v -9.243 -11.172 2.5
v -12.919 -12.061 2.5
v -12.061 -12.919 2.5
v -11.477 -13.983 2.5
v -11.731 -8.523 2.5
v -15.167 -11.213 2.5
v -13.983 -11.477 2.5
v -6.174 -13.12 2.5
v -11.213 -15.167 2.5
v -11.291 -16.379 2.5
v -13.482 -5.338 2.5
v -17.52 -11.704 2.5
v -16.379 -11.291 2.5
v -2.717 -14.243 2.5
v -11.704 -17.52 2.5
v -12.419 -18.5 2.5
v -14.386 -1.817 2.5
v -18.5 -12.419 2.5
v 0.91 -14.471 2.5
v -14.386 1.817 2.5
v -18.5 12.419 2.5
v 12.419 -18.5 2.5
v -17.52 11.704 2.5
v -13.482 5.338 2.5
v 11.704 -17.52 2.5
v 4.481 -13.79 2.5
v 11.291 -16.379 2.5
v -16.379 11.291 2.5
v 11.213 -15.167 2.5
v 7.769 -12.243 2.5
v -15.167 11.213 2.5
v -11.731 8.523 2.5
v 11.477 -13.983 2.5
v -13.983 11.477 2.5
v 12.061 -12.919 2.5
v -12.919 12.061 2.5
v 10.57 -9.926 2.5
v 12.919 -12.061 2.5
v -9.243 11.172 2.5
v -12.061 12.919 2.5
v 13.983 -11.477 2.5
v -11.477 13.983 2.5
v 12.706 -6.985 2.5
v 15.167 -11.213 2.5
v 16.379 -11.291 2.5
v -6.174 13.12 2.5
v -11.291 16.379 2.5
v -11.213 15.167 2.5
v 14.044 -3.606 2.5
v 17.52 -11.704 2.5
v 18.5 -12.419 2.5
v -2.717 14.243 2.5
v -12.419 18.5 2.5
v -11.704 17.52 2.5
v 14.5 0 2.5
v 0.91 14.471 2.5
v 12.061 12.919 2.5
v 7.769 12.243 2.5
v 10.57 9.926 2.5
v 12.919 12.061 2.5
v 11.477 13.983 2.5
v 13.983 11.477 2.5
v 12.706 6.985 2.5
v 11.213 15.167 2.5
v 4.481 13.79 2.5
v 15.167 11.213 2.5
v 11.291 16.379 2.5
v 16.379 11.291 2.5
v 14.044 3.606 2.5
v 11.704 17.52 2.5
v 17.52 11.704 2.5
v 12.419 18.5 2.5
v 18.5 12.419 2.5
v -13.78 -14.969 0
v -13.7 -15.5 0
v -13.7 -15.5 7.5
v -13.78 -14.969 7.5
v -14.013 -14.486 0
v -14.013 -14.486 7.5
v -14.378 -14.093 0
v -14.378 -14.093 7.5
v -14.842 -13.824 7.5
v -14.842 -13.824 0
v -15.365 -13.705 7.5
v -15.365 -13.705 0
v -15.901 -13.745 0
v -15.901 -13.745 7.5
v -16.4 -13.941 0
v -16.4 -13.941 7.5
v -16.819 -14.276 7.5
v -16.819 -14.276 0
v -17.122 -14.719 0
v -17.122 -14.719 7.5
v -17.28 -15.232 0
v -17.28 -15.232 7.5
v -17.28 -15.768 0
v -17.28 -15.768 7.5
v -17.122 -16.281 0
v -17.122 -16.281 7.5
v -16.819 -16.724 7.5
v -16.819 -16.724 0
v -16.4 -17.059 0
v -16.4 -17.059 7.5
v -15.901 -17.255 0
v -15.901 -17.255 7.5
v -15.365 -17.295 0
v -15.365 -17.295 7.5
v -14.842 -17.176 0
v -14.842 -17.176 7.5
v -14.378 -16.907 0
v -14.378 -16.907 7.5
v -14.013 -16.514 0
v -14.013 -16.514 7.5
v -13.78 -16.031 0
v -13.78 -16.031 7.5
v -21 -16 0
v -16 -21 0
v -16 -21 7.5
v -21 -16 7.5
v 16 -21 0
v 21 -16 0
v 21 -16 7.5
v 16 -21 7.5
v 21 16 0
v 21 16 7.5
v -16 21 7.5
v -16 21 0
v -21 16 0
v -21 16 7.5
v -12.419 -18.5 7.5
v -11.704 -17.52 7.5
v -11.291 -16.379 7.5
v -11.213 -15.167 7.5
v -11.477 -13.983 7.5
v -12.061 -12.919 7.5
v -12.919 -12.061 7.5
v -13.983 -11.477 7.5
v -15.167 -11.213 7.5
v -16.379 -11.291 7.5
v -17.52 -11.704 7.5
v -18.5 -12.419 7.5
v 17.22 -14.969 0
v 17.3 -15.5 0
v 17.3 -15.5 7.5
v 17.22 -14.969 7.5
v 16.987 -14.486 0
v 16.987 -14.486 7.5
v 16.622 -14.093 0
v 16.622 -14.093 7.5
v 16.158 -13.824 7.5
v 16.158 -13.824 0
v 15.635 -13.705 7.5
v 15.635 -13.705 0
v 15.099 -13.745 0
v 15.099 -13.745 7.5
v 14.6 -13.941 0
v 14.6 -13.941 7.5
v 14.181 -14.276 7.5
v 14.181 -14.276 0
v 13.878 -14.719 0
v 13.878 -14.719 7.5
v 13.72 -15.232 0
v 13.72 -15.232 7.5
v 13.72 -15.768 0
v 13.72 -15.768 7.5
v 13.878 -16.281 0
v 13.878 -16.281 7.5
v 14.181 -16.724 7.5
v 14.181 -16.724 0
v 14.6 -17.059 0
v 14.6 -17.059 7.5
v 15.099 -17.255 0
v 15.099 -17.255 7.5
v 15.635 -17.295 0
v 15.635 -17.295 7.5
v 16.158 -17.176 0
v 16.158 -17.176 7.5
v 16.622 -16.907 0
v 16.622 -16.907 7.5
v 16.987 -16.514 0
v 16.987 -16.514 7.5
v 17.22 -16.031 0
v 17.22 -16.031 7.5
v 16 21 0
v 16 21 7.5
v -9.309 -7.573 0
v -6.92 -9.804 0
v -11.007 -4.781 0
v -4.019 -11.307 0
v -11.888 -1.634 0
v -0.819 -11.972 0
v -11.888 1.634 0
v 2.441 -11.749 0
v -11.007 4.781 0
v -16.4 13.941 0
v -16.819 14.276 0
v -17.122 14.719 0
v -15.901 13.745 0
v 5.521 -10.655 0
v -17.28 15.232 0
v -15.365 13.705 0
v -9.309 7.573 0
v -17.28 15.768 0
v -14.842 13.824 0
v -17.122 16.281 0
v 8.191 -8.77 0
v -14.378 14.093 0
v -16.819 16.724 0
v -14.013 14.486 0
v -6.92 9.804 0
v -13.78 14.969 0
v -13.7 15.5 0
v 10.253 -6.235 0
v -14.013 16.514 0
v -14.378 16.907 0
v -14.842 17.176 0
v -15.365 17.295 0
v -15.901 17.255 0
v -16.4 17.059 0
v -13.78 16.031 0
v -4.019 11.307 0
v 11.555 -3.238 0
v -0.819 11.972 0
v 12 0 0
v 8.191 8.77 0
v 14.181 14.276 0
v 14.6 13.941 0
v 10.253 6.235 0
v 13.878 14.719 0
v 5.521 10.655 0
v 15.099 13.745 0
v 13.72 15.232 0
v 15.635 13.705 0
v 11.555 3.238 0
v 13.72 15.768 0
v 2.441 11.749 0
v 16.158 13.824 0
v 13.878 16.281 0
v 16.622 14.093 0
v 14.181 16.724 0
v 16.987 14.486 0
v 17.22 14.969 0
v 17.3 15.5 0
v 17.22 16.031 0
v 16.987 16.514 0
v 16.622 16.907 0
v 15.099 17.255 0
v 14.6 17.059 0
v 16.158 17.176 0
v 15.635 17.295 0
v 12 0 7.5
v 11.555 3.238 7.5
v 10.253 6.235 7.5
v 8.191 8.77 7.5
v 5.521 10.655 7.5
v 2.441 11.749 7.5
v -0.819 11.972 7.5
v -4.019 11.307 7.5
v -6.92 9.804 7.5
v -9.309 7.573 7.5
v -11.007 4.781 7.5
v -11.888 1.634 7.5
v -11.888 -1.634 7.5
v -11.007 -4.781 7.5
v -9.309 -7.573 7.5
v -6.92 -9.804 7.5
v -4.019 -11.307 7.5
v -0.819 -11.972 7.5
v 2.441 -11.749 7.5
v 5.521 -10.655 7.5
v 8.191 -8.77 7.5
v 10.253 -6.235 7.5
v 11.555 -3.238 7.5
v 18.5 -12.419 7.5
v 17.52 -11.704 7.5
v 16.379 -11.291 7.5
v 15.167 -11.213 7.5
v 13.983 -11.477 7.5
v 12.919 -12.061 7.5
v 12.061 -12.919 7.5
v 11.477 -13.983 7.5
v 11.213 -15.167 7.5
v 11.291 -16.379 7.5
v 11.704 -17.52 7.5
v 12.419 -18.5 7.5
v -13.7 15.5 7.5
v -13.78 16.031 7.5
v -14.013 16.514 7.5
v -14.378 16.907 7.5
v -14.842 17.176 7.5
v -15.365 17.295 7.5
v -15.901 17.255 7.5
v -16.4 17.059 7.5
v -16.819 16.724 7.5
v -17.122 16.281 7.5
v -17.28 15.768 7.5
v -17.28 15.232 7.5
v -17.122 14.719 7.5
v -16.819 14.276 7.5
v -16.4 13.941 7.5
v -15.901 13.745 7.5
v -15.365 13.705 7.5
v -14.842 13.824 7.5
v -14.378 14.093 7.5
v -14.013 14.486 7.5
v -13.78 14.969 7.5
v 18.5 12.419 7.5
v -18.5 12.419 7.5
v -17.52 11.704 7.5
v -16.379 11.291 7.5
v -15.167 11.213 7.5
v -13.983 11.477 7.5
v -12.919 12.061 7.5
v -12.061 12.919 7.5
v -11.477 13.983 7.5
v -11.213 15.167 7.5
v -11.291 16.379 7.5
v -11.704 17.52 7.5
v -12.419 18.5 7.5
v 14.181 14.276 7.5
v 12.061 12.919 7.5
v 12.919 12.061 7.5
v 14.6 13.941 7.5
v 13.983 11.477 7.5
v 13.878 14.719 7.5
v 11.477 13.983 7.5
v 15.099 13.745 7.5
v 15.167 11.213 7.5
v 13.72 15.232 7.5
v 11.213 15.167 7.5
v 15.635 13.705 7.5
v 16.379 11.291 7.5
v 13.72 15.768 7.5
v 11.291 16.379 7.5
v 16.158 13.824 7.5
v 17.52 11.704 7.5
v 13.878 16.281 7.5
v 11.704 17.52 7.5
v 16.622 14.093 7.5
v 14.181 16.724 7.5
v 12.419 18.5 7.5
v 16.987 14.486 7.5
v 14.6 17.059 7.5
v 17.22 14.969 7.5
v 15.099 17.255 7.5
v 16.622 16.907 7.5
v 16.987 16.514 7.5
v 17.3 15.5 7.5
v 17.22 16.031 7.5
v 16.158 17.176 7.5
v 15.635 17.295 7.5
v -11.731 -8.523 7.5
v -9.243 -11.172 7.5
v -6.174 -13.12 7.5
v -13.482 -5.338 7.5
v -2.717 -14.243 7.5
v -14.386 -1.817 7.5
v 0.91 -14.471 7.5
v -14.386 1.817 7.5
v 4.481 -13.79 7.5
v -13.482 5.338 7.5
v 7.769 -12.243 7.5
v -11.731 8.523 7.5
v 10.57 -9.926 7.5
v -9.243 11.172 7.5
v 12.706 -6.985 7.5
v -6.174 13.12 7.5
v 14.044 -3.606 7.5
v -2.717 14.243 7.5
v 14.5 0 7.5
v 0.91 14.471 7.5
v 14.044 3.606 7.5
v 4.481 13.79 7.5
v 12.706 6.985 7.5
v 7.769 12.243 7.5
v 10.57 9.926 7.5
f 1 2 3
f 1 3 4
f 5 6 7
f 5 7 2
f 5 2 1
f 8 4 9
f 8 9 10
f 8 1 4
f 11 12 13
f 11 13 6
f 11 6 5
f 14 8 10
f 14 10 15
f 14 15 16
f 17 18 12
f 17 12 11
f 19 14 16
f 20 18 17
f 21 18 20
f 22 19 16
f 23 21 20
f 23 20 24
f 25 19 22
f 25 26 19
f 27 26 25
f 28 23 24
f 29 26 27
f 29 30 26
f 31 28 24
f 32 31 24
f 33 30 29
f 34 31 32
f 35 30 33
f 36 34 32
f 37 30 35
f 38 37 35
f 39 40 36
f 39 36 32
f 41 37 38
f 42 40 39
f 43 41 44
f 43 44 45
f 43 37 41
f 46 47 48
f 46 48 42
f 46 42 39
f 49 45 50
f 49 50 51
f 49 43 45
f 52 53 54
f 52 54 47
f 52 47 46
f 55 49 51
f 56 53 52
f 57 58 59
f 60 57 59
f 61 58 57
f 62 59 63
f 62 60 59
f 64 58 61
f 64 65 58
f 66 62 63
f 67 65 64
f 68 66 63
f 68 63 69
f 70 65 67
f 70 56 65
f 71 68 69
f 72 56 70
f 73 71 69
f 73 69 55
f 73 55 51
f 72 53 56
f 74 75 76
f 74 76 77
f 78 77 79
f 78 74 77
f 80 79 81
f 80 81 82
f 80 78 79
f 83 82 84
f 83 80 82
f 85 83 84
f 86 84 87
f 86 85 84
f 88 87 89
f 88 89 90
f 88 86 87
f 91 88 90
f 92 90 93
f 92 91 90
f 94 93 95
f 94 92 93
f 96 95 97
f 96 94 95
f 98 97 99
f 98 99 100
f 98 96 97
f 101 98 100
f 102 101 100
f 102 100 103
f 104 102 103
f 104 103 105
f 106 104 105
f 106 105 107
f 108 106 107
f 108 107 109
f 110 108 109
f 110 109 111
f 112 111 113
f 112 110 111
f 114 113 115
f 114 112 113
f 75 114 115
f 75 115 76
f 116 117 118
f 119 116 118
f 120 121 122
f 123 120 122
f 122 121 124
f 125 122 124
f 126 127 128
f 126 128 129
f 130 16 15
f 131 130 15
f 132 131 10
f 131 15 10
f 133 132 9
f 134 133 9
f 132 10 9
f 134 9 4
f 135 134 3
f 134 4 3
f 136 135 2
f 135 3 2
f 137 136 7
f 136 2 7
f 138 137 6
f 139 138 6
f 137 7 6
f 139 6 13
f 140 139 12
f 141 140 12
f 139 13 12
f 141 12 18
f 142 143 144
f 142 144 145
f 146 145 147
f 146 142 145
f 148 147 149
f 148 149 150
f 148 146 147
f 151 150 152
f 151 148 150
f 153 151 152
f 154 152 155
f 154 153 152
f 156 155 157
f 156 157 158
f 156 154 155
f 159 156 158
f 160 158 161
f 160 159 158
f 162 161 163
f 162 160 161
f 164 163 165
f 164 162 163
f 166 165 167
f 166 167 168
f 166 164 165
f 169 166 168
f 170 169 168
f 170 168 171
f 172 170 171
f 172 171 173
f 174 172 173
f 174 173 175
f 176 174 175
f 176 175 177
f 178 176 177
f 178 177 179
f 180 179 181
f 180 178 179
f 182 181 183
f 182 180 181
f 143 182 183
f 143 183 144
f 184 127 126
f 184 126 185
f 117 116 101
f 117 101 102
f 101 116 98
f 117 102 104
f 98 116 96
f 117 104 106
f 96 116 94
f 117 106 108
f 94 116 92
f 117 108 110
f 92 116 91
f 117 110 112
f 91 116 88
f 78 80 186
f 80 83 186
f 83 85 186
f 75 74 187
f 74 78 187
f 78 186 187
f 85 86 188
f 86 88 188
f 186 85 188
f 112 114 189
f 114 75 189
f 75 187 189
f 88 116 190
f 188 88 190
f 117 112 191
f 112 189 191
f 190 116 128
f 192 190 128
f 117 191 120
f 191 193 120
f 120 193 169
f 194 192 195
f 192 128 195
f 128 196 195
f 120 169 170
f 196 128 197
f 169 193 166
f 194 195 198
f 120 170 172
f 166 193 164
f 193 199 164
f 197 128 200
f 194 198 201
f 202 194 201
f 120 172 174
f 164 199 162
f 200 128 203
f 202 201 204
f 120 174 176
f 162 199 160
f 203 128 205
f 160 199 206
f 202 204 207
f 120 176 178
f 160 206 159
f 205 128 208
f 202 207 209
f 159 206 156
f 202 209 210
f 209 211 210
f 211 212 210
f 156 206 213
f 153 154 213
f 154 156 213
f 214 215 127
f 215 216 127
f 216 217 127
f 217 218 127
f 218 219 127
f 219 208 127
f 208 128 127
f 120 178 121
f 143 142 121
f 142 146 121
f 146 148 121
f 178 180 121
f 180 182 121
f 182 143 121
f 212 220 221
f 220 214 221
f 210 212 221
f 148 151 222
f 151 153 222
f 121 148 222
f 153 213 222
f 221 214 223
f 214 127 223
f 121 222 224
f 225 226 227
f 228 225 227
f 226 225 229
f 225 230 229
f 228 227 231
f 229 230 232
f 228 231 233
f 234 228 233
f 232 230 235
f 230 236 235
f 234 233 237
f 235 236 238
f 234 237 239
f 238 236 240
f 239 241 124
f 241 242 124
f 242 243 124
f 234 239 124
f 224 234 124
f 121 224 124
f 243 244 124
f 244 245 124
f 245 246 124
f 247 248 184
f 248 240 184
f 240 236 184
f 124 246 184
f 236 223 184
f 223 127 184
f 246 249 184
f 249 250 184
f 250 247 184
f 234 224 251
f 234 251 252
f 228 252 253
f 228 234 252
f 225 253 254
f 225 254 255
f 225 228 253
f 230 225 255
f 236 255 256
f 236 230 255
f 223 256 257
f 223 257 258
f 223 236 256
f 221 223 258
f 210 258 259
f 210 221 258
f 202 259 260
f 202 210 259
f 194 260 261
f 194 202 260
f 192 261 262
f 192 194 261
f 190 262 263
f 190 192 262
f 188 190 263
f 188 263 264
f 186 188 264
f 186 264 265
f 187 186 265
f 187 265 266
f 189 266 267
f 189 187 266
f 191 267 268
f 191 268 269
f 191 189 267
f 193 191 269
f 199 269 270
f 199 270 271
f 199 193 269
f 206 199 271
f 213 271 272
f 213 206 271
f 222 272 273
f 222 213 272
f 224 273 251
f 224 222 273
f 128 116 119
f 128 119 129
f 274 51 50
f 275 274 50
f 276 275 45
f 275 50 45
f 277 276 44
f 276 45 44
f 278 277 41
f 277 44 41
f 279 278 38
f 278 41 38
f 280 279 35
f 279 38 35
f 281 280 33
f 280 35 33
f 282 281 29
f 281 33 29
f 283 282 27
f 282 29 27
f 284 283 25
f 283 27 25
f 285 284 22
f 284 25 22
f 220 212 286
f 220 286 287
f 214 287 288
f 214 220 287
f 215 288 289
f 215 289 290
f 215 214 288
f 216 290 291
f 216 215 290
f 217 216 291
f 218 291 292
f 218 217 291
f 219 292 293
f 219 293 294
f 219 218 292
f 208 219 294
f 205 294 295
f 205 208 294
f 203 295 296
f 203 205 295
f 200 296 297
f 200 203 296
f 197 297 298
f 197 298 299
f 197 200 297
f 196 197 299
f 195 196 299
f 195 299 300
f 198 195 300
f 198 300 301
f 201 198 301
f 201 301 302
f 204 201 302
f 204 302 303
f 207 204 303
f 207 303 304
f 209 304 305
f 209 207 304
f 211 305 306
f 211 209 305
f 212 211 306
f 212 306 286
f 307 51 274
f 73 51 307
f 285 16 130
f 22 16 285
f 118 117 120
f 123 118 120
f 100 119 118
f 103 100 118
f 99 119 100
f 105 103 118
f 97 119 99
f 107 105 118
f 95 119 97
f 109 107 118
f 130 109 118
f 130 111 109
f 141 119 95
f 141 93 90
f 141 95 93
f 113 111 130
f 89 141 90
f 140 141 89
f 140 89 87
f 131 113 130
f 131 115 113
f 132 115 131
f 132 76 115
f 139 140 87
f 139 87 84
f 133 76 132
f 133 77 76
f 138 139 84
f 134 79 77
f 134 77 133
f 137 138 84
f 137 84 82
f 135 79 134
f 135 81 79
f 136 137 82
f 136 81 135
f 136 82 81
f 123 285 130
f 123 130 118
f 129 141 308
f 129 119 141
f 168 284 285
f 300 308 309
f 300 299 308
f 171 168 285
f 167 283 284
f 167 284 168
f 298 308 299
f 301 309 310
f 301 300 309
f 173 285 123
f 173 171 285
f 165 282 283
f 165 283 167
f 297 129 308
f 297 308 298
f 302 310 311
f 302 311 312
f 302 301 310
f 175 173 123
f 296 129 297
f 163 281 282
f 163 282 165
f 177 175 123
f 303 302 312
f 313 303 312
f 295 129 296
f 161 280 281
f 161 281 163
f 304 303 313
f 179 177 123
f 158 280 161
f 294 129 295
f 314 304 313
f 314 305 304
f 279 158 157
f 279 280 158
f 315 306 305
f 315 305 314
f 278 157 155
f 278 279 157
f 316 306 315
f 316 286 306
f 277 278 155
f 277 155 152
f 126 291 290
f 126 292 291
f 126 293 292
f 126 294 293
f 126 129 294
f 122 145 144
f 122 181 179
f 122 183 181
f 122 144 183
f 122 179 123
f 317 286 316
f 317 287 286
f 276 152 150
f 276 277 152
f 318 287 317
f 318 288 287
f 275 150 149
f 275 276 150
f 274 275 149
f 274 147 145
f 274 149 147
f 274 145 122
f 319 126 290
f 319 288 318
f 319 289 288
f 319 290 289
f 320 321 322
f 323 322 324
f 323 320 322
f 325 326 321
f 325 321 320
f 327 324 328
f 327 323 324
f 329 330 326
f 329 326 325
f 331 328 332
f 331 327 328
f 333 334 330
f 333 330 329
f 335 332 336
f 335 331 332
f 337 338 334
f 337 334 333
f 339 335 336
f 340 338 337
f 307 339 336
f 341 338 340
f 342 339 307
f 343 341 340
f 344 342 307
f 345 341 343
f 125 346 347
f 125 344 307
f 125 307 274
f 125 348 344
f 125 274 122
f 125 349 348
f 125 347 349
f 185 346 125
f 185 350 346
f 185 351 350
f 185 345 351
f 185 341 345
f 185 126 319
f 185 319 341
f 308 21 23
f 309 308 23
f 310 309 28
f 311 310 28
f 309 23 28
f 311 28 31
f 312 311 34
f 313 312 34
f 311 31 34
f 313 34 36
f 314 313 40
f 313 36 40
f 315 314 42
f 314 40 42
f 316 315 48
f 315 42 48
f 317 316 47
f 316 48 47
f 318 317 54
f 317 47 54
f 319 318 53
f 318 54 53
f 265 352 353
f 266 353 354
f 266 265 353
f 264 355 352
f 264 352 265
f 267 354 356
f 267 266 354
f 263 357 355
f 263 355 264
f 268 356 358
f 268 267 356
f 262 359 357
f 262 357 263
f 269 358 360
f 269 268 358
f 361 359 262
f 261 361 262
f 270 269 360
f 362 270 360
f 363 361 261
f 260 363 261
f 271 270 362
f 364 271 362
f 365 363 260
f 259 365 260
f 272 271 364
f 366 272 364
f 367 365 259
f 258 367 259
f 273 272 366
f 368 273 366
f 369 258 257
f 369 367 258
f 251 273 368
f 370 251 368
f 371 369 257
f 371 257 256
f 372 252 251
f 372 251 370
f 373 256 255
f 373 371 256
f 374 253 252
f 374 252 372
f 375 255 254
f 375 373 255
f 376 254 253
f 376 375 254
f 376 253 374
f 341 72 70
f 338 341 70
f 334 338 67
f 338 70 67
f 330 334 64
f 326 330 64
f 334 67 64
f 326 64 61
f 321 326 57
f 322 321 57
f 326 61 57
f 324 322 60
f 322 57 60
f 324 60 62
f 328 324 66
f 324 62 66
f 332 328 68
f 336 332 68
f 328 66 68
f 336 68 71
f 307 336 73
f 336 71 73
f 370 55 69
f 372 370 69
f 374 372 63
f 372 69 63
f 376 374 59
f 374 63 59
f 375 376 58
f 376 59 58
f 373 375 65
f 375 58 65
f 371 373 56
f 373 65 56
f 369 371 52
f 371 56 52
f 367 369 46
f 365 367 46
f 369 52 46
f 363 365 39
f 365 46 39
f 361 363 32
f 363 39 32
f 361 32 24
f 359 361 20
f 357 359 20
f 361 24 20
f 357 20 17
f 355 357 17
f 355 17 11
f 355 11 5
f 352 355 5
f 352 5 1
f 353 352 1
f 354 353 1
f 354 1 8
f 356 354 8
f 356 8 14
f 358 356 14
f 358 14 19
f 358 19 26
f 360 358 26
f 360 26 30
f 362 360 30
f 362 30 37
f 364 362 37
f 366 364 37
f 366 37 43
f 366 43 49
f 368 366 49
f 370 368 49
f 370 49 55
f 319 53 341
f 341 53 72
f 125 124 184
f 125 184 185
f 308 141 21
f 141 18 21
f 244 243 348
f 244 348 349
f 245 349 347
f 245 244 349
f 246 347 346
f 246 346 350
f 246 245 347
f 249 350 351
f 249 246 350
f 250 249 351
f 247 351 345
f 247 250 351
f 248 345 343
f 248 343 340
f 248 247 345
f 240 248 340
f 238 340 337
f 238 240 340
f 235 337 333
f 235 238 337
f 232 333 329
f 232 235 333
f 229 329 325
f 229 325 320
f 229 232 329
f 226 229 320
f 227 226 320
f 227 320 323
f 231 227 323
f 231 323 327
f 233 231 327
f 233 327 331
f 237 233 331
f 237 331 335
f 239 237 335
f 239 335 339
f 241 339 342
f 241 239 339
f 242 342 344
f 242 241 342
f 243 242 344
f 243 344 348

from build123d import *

# Parameters (mm, degrees)
F0_W     = 42
F0_H     = 42
F0_R     = 1.8
F0_R_2   = 12
F1_DEPTH = 7.5
F2_SIZE  = 5
F3_T     = -2.5


with BuildPart() as f1:
    # F0 (on Top) → F1 (new body)
    with BuildSketch(Plane.XY):
        Rectangle(F0_W, F0_H)
        with Locations((-15.5, -15.5)):
            Circle(F0_R, mode=Mode.SUBTRACT)
        with Locations((15.5, -15.5)):
            Circle(F0_R, mode=Mode.SUBTRACT)
        with Locations((-15.5, 15.5)):
            Circle(F0_R, mode=Mode.SUBTRACT)
        Circle(F0_R_2, mode=Mode.SUBTRACT)
        with Locations((15.5, 15.5)):
            Circle(F0_R, mode=Mode.SUBTRACT)
    extrude(amount=F1_DEPTH)

    # F2
    f2_edges = [f1.edges().sort_by_distance(p)[0] for p in [
        (21, -21, 3.75),
        (21, 21, 3.75),
        (-21, -21, 3.75),
        (-21, 21, 3.75),
    ]]
    chamfer(f2_edges, length=F2_SIZE)

    # F3
    f3_openings = [f1.faces().sort_by_distance(p)[0] for p in [
        (20.40603, 0, 7.5),
    ]]
    offset(amount=F3_T, openings=f3_openings)


solid = f1.part
